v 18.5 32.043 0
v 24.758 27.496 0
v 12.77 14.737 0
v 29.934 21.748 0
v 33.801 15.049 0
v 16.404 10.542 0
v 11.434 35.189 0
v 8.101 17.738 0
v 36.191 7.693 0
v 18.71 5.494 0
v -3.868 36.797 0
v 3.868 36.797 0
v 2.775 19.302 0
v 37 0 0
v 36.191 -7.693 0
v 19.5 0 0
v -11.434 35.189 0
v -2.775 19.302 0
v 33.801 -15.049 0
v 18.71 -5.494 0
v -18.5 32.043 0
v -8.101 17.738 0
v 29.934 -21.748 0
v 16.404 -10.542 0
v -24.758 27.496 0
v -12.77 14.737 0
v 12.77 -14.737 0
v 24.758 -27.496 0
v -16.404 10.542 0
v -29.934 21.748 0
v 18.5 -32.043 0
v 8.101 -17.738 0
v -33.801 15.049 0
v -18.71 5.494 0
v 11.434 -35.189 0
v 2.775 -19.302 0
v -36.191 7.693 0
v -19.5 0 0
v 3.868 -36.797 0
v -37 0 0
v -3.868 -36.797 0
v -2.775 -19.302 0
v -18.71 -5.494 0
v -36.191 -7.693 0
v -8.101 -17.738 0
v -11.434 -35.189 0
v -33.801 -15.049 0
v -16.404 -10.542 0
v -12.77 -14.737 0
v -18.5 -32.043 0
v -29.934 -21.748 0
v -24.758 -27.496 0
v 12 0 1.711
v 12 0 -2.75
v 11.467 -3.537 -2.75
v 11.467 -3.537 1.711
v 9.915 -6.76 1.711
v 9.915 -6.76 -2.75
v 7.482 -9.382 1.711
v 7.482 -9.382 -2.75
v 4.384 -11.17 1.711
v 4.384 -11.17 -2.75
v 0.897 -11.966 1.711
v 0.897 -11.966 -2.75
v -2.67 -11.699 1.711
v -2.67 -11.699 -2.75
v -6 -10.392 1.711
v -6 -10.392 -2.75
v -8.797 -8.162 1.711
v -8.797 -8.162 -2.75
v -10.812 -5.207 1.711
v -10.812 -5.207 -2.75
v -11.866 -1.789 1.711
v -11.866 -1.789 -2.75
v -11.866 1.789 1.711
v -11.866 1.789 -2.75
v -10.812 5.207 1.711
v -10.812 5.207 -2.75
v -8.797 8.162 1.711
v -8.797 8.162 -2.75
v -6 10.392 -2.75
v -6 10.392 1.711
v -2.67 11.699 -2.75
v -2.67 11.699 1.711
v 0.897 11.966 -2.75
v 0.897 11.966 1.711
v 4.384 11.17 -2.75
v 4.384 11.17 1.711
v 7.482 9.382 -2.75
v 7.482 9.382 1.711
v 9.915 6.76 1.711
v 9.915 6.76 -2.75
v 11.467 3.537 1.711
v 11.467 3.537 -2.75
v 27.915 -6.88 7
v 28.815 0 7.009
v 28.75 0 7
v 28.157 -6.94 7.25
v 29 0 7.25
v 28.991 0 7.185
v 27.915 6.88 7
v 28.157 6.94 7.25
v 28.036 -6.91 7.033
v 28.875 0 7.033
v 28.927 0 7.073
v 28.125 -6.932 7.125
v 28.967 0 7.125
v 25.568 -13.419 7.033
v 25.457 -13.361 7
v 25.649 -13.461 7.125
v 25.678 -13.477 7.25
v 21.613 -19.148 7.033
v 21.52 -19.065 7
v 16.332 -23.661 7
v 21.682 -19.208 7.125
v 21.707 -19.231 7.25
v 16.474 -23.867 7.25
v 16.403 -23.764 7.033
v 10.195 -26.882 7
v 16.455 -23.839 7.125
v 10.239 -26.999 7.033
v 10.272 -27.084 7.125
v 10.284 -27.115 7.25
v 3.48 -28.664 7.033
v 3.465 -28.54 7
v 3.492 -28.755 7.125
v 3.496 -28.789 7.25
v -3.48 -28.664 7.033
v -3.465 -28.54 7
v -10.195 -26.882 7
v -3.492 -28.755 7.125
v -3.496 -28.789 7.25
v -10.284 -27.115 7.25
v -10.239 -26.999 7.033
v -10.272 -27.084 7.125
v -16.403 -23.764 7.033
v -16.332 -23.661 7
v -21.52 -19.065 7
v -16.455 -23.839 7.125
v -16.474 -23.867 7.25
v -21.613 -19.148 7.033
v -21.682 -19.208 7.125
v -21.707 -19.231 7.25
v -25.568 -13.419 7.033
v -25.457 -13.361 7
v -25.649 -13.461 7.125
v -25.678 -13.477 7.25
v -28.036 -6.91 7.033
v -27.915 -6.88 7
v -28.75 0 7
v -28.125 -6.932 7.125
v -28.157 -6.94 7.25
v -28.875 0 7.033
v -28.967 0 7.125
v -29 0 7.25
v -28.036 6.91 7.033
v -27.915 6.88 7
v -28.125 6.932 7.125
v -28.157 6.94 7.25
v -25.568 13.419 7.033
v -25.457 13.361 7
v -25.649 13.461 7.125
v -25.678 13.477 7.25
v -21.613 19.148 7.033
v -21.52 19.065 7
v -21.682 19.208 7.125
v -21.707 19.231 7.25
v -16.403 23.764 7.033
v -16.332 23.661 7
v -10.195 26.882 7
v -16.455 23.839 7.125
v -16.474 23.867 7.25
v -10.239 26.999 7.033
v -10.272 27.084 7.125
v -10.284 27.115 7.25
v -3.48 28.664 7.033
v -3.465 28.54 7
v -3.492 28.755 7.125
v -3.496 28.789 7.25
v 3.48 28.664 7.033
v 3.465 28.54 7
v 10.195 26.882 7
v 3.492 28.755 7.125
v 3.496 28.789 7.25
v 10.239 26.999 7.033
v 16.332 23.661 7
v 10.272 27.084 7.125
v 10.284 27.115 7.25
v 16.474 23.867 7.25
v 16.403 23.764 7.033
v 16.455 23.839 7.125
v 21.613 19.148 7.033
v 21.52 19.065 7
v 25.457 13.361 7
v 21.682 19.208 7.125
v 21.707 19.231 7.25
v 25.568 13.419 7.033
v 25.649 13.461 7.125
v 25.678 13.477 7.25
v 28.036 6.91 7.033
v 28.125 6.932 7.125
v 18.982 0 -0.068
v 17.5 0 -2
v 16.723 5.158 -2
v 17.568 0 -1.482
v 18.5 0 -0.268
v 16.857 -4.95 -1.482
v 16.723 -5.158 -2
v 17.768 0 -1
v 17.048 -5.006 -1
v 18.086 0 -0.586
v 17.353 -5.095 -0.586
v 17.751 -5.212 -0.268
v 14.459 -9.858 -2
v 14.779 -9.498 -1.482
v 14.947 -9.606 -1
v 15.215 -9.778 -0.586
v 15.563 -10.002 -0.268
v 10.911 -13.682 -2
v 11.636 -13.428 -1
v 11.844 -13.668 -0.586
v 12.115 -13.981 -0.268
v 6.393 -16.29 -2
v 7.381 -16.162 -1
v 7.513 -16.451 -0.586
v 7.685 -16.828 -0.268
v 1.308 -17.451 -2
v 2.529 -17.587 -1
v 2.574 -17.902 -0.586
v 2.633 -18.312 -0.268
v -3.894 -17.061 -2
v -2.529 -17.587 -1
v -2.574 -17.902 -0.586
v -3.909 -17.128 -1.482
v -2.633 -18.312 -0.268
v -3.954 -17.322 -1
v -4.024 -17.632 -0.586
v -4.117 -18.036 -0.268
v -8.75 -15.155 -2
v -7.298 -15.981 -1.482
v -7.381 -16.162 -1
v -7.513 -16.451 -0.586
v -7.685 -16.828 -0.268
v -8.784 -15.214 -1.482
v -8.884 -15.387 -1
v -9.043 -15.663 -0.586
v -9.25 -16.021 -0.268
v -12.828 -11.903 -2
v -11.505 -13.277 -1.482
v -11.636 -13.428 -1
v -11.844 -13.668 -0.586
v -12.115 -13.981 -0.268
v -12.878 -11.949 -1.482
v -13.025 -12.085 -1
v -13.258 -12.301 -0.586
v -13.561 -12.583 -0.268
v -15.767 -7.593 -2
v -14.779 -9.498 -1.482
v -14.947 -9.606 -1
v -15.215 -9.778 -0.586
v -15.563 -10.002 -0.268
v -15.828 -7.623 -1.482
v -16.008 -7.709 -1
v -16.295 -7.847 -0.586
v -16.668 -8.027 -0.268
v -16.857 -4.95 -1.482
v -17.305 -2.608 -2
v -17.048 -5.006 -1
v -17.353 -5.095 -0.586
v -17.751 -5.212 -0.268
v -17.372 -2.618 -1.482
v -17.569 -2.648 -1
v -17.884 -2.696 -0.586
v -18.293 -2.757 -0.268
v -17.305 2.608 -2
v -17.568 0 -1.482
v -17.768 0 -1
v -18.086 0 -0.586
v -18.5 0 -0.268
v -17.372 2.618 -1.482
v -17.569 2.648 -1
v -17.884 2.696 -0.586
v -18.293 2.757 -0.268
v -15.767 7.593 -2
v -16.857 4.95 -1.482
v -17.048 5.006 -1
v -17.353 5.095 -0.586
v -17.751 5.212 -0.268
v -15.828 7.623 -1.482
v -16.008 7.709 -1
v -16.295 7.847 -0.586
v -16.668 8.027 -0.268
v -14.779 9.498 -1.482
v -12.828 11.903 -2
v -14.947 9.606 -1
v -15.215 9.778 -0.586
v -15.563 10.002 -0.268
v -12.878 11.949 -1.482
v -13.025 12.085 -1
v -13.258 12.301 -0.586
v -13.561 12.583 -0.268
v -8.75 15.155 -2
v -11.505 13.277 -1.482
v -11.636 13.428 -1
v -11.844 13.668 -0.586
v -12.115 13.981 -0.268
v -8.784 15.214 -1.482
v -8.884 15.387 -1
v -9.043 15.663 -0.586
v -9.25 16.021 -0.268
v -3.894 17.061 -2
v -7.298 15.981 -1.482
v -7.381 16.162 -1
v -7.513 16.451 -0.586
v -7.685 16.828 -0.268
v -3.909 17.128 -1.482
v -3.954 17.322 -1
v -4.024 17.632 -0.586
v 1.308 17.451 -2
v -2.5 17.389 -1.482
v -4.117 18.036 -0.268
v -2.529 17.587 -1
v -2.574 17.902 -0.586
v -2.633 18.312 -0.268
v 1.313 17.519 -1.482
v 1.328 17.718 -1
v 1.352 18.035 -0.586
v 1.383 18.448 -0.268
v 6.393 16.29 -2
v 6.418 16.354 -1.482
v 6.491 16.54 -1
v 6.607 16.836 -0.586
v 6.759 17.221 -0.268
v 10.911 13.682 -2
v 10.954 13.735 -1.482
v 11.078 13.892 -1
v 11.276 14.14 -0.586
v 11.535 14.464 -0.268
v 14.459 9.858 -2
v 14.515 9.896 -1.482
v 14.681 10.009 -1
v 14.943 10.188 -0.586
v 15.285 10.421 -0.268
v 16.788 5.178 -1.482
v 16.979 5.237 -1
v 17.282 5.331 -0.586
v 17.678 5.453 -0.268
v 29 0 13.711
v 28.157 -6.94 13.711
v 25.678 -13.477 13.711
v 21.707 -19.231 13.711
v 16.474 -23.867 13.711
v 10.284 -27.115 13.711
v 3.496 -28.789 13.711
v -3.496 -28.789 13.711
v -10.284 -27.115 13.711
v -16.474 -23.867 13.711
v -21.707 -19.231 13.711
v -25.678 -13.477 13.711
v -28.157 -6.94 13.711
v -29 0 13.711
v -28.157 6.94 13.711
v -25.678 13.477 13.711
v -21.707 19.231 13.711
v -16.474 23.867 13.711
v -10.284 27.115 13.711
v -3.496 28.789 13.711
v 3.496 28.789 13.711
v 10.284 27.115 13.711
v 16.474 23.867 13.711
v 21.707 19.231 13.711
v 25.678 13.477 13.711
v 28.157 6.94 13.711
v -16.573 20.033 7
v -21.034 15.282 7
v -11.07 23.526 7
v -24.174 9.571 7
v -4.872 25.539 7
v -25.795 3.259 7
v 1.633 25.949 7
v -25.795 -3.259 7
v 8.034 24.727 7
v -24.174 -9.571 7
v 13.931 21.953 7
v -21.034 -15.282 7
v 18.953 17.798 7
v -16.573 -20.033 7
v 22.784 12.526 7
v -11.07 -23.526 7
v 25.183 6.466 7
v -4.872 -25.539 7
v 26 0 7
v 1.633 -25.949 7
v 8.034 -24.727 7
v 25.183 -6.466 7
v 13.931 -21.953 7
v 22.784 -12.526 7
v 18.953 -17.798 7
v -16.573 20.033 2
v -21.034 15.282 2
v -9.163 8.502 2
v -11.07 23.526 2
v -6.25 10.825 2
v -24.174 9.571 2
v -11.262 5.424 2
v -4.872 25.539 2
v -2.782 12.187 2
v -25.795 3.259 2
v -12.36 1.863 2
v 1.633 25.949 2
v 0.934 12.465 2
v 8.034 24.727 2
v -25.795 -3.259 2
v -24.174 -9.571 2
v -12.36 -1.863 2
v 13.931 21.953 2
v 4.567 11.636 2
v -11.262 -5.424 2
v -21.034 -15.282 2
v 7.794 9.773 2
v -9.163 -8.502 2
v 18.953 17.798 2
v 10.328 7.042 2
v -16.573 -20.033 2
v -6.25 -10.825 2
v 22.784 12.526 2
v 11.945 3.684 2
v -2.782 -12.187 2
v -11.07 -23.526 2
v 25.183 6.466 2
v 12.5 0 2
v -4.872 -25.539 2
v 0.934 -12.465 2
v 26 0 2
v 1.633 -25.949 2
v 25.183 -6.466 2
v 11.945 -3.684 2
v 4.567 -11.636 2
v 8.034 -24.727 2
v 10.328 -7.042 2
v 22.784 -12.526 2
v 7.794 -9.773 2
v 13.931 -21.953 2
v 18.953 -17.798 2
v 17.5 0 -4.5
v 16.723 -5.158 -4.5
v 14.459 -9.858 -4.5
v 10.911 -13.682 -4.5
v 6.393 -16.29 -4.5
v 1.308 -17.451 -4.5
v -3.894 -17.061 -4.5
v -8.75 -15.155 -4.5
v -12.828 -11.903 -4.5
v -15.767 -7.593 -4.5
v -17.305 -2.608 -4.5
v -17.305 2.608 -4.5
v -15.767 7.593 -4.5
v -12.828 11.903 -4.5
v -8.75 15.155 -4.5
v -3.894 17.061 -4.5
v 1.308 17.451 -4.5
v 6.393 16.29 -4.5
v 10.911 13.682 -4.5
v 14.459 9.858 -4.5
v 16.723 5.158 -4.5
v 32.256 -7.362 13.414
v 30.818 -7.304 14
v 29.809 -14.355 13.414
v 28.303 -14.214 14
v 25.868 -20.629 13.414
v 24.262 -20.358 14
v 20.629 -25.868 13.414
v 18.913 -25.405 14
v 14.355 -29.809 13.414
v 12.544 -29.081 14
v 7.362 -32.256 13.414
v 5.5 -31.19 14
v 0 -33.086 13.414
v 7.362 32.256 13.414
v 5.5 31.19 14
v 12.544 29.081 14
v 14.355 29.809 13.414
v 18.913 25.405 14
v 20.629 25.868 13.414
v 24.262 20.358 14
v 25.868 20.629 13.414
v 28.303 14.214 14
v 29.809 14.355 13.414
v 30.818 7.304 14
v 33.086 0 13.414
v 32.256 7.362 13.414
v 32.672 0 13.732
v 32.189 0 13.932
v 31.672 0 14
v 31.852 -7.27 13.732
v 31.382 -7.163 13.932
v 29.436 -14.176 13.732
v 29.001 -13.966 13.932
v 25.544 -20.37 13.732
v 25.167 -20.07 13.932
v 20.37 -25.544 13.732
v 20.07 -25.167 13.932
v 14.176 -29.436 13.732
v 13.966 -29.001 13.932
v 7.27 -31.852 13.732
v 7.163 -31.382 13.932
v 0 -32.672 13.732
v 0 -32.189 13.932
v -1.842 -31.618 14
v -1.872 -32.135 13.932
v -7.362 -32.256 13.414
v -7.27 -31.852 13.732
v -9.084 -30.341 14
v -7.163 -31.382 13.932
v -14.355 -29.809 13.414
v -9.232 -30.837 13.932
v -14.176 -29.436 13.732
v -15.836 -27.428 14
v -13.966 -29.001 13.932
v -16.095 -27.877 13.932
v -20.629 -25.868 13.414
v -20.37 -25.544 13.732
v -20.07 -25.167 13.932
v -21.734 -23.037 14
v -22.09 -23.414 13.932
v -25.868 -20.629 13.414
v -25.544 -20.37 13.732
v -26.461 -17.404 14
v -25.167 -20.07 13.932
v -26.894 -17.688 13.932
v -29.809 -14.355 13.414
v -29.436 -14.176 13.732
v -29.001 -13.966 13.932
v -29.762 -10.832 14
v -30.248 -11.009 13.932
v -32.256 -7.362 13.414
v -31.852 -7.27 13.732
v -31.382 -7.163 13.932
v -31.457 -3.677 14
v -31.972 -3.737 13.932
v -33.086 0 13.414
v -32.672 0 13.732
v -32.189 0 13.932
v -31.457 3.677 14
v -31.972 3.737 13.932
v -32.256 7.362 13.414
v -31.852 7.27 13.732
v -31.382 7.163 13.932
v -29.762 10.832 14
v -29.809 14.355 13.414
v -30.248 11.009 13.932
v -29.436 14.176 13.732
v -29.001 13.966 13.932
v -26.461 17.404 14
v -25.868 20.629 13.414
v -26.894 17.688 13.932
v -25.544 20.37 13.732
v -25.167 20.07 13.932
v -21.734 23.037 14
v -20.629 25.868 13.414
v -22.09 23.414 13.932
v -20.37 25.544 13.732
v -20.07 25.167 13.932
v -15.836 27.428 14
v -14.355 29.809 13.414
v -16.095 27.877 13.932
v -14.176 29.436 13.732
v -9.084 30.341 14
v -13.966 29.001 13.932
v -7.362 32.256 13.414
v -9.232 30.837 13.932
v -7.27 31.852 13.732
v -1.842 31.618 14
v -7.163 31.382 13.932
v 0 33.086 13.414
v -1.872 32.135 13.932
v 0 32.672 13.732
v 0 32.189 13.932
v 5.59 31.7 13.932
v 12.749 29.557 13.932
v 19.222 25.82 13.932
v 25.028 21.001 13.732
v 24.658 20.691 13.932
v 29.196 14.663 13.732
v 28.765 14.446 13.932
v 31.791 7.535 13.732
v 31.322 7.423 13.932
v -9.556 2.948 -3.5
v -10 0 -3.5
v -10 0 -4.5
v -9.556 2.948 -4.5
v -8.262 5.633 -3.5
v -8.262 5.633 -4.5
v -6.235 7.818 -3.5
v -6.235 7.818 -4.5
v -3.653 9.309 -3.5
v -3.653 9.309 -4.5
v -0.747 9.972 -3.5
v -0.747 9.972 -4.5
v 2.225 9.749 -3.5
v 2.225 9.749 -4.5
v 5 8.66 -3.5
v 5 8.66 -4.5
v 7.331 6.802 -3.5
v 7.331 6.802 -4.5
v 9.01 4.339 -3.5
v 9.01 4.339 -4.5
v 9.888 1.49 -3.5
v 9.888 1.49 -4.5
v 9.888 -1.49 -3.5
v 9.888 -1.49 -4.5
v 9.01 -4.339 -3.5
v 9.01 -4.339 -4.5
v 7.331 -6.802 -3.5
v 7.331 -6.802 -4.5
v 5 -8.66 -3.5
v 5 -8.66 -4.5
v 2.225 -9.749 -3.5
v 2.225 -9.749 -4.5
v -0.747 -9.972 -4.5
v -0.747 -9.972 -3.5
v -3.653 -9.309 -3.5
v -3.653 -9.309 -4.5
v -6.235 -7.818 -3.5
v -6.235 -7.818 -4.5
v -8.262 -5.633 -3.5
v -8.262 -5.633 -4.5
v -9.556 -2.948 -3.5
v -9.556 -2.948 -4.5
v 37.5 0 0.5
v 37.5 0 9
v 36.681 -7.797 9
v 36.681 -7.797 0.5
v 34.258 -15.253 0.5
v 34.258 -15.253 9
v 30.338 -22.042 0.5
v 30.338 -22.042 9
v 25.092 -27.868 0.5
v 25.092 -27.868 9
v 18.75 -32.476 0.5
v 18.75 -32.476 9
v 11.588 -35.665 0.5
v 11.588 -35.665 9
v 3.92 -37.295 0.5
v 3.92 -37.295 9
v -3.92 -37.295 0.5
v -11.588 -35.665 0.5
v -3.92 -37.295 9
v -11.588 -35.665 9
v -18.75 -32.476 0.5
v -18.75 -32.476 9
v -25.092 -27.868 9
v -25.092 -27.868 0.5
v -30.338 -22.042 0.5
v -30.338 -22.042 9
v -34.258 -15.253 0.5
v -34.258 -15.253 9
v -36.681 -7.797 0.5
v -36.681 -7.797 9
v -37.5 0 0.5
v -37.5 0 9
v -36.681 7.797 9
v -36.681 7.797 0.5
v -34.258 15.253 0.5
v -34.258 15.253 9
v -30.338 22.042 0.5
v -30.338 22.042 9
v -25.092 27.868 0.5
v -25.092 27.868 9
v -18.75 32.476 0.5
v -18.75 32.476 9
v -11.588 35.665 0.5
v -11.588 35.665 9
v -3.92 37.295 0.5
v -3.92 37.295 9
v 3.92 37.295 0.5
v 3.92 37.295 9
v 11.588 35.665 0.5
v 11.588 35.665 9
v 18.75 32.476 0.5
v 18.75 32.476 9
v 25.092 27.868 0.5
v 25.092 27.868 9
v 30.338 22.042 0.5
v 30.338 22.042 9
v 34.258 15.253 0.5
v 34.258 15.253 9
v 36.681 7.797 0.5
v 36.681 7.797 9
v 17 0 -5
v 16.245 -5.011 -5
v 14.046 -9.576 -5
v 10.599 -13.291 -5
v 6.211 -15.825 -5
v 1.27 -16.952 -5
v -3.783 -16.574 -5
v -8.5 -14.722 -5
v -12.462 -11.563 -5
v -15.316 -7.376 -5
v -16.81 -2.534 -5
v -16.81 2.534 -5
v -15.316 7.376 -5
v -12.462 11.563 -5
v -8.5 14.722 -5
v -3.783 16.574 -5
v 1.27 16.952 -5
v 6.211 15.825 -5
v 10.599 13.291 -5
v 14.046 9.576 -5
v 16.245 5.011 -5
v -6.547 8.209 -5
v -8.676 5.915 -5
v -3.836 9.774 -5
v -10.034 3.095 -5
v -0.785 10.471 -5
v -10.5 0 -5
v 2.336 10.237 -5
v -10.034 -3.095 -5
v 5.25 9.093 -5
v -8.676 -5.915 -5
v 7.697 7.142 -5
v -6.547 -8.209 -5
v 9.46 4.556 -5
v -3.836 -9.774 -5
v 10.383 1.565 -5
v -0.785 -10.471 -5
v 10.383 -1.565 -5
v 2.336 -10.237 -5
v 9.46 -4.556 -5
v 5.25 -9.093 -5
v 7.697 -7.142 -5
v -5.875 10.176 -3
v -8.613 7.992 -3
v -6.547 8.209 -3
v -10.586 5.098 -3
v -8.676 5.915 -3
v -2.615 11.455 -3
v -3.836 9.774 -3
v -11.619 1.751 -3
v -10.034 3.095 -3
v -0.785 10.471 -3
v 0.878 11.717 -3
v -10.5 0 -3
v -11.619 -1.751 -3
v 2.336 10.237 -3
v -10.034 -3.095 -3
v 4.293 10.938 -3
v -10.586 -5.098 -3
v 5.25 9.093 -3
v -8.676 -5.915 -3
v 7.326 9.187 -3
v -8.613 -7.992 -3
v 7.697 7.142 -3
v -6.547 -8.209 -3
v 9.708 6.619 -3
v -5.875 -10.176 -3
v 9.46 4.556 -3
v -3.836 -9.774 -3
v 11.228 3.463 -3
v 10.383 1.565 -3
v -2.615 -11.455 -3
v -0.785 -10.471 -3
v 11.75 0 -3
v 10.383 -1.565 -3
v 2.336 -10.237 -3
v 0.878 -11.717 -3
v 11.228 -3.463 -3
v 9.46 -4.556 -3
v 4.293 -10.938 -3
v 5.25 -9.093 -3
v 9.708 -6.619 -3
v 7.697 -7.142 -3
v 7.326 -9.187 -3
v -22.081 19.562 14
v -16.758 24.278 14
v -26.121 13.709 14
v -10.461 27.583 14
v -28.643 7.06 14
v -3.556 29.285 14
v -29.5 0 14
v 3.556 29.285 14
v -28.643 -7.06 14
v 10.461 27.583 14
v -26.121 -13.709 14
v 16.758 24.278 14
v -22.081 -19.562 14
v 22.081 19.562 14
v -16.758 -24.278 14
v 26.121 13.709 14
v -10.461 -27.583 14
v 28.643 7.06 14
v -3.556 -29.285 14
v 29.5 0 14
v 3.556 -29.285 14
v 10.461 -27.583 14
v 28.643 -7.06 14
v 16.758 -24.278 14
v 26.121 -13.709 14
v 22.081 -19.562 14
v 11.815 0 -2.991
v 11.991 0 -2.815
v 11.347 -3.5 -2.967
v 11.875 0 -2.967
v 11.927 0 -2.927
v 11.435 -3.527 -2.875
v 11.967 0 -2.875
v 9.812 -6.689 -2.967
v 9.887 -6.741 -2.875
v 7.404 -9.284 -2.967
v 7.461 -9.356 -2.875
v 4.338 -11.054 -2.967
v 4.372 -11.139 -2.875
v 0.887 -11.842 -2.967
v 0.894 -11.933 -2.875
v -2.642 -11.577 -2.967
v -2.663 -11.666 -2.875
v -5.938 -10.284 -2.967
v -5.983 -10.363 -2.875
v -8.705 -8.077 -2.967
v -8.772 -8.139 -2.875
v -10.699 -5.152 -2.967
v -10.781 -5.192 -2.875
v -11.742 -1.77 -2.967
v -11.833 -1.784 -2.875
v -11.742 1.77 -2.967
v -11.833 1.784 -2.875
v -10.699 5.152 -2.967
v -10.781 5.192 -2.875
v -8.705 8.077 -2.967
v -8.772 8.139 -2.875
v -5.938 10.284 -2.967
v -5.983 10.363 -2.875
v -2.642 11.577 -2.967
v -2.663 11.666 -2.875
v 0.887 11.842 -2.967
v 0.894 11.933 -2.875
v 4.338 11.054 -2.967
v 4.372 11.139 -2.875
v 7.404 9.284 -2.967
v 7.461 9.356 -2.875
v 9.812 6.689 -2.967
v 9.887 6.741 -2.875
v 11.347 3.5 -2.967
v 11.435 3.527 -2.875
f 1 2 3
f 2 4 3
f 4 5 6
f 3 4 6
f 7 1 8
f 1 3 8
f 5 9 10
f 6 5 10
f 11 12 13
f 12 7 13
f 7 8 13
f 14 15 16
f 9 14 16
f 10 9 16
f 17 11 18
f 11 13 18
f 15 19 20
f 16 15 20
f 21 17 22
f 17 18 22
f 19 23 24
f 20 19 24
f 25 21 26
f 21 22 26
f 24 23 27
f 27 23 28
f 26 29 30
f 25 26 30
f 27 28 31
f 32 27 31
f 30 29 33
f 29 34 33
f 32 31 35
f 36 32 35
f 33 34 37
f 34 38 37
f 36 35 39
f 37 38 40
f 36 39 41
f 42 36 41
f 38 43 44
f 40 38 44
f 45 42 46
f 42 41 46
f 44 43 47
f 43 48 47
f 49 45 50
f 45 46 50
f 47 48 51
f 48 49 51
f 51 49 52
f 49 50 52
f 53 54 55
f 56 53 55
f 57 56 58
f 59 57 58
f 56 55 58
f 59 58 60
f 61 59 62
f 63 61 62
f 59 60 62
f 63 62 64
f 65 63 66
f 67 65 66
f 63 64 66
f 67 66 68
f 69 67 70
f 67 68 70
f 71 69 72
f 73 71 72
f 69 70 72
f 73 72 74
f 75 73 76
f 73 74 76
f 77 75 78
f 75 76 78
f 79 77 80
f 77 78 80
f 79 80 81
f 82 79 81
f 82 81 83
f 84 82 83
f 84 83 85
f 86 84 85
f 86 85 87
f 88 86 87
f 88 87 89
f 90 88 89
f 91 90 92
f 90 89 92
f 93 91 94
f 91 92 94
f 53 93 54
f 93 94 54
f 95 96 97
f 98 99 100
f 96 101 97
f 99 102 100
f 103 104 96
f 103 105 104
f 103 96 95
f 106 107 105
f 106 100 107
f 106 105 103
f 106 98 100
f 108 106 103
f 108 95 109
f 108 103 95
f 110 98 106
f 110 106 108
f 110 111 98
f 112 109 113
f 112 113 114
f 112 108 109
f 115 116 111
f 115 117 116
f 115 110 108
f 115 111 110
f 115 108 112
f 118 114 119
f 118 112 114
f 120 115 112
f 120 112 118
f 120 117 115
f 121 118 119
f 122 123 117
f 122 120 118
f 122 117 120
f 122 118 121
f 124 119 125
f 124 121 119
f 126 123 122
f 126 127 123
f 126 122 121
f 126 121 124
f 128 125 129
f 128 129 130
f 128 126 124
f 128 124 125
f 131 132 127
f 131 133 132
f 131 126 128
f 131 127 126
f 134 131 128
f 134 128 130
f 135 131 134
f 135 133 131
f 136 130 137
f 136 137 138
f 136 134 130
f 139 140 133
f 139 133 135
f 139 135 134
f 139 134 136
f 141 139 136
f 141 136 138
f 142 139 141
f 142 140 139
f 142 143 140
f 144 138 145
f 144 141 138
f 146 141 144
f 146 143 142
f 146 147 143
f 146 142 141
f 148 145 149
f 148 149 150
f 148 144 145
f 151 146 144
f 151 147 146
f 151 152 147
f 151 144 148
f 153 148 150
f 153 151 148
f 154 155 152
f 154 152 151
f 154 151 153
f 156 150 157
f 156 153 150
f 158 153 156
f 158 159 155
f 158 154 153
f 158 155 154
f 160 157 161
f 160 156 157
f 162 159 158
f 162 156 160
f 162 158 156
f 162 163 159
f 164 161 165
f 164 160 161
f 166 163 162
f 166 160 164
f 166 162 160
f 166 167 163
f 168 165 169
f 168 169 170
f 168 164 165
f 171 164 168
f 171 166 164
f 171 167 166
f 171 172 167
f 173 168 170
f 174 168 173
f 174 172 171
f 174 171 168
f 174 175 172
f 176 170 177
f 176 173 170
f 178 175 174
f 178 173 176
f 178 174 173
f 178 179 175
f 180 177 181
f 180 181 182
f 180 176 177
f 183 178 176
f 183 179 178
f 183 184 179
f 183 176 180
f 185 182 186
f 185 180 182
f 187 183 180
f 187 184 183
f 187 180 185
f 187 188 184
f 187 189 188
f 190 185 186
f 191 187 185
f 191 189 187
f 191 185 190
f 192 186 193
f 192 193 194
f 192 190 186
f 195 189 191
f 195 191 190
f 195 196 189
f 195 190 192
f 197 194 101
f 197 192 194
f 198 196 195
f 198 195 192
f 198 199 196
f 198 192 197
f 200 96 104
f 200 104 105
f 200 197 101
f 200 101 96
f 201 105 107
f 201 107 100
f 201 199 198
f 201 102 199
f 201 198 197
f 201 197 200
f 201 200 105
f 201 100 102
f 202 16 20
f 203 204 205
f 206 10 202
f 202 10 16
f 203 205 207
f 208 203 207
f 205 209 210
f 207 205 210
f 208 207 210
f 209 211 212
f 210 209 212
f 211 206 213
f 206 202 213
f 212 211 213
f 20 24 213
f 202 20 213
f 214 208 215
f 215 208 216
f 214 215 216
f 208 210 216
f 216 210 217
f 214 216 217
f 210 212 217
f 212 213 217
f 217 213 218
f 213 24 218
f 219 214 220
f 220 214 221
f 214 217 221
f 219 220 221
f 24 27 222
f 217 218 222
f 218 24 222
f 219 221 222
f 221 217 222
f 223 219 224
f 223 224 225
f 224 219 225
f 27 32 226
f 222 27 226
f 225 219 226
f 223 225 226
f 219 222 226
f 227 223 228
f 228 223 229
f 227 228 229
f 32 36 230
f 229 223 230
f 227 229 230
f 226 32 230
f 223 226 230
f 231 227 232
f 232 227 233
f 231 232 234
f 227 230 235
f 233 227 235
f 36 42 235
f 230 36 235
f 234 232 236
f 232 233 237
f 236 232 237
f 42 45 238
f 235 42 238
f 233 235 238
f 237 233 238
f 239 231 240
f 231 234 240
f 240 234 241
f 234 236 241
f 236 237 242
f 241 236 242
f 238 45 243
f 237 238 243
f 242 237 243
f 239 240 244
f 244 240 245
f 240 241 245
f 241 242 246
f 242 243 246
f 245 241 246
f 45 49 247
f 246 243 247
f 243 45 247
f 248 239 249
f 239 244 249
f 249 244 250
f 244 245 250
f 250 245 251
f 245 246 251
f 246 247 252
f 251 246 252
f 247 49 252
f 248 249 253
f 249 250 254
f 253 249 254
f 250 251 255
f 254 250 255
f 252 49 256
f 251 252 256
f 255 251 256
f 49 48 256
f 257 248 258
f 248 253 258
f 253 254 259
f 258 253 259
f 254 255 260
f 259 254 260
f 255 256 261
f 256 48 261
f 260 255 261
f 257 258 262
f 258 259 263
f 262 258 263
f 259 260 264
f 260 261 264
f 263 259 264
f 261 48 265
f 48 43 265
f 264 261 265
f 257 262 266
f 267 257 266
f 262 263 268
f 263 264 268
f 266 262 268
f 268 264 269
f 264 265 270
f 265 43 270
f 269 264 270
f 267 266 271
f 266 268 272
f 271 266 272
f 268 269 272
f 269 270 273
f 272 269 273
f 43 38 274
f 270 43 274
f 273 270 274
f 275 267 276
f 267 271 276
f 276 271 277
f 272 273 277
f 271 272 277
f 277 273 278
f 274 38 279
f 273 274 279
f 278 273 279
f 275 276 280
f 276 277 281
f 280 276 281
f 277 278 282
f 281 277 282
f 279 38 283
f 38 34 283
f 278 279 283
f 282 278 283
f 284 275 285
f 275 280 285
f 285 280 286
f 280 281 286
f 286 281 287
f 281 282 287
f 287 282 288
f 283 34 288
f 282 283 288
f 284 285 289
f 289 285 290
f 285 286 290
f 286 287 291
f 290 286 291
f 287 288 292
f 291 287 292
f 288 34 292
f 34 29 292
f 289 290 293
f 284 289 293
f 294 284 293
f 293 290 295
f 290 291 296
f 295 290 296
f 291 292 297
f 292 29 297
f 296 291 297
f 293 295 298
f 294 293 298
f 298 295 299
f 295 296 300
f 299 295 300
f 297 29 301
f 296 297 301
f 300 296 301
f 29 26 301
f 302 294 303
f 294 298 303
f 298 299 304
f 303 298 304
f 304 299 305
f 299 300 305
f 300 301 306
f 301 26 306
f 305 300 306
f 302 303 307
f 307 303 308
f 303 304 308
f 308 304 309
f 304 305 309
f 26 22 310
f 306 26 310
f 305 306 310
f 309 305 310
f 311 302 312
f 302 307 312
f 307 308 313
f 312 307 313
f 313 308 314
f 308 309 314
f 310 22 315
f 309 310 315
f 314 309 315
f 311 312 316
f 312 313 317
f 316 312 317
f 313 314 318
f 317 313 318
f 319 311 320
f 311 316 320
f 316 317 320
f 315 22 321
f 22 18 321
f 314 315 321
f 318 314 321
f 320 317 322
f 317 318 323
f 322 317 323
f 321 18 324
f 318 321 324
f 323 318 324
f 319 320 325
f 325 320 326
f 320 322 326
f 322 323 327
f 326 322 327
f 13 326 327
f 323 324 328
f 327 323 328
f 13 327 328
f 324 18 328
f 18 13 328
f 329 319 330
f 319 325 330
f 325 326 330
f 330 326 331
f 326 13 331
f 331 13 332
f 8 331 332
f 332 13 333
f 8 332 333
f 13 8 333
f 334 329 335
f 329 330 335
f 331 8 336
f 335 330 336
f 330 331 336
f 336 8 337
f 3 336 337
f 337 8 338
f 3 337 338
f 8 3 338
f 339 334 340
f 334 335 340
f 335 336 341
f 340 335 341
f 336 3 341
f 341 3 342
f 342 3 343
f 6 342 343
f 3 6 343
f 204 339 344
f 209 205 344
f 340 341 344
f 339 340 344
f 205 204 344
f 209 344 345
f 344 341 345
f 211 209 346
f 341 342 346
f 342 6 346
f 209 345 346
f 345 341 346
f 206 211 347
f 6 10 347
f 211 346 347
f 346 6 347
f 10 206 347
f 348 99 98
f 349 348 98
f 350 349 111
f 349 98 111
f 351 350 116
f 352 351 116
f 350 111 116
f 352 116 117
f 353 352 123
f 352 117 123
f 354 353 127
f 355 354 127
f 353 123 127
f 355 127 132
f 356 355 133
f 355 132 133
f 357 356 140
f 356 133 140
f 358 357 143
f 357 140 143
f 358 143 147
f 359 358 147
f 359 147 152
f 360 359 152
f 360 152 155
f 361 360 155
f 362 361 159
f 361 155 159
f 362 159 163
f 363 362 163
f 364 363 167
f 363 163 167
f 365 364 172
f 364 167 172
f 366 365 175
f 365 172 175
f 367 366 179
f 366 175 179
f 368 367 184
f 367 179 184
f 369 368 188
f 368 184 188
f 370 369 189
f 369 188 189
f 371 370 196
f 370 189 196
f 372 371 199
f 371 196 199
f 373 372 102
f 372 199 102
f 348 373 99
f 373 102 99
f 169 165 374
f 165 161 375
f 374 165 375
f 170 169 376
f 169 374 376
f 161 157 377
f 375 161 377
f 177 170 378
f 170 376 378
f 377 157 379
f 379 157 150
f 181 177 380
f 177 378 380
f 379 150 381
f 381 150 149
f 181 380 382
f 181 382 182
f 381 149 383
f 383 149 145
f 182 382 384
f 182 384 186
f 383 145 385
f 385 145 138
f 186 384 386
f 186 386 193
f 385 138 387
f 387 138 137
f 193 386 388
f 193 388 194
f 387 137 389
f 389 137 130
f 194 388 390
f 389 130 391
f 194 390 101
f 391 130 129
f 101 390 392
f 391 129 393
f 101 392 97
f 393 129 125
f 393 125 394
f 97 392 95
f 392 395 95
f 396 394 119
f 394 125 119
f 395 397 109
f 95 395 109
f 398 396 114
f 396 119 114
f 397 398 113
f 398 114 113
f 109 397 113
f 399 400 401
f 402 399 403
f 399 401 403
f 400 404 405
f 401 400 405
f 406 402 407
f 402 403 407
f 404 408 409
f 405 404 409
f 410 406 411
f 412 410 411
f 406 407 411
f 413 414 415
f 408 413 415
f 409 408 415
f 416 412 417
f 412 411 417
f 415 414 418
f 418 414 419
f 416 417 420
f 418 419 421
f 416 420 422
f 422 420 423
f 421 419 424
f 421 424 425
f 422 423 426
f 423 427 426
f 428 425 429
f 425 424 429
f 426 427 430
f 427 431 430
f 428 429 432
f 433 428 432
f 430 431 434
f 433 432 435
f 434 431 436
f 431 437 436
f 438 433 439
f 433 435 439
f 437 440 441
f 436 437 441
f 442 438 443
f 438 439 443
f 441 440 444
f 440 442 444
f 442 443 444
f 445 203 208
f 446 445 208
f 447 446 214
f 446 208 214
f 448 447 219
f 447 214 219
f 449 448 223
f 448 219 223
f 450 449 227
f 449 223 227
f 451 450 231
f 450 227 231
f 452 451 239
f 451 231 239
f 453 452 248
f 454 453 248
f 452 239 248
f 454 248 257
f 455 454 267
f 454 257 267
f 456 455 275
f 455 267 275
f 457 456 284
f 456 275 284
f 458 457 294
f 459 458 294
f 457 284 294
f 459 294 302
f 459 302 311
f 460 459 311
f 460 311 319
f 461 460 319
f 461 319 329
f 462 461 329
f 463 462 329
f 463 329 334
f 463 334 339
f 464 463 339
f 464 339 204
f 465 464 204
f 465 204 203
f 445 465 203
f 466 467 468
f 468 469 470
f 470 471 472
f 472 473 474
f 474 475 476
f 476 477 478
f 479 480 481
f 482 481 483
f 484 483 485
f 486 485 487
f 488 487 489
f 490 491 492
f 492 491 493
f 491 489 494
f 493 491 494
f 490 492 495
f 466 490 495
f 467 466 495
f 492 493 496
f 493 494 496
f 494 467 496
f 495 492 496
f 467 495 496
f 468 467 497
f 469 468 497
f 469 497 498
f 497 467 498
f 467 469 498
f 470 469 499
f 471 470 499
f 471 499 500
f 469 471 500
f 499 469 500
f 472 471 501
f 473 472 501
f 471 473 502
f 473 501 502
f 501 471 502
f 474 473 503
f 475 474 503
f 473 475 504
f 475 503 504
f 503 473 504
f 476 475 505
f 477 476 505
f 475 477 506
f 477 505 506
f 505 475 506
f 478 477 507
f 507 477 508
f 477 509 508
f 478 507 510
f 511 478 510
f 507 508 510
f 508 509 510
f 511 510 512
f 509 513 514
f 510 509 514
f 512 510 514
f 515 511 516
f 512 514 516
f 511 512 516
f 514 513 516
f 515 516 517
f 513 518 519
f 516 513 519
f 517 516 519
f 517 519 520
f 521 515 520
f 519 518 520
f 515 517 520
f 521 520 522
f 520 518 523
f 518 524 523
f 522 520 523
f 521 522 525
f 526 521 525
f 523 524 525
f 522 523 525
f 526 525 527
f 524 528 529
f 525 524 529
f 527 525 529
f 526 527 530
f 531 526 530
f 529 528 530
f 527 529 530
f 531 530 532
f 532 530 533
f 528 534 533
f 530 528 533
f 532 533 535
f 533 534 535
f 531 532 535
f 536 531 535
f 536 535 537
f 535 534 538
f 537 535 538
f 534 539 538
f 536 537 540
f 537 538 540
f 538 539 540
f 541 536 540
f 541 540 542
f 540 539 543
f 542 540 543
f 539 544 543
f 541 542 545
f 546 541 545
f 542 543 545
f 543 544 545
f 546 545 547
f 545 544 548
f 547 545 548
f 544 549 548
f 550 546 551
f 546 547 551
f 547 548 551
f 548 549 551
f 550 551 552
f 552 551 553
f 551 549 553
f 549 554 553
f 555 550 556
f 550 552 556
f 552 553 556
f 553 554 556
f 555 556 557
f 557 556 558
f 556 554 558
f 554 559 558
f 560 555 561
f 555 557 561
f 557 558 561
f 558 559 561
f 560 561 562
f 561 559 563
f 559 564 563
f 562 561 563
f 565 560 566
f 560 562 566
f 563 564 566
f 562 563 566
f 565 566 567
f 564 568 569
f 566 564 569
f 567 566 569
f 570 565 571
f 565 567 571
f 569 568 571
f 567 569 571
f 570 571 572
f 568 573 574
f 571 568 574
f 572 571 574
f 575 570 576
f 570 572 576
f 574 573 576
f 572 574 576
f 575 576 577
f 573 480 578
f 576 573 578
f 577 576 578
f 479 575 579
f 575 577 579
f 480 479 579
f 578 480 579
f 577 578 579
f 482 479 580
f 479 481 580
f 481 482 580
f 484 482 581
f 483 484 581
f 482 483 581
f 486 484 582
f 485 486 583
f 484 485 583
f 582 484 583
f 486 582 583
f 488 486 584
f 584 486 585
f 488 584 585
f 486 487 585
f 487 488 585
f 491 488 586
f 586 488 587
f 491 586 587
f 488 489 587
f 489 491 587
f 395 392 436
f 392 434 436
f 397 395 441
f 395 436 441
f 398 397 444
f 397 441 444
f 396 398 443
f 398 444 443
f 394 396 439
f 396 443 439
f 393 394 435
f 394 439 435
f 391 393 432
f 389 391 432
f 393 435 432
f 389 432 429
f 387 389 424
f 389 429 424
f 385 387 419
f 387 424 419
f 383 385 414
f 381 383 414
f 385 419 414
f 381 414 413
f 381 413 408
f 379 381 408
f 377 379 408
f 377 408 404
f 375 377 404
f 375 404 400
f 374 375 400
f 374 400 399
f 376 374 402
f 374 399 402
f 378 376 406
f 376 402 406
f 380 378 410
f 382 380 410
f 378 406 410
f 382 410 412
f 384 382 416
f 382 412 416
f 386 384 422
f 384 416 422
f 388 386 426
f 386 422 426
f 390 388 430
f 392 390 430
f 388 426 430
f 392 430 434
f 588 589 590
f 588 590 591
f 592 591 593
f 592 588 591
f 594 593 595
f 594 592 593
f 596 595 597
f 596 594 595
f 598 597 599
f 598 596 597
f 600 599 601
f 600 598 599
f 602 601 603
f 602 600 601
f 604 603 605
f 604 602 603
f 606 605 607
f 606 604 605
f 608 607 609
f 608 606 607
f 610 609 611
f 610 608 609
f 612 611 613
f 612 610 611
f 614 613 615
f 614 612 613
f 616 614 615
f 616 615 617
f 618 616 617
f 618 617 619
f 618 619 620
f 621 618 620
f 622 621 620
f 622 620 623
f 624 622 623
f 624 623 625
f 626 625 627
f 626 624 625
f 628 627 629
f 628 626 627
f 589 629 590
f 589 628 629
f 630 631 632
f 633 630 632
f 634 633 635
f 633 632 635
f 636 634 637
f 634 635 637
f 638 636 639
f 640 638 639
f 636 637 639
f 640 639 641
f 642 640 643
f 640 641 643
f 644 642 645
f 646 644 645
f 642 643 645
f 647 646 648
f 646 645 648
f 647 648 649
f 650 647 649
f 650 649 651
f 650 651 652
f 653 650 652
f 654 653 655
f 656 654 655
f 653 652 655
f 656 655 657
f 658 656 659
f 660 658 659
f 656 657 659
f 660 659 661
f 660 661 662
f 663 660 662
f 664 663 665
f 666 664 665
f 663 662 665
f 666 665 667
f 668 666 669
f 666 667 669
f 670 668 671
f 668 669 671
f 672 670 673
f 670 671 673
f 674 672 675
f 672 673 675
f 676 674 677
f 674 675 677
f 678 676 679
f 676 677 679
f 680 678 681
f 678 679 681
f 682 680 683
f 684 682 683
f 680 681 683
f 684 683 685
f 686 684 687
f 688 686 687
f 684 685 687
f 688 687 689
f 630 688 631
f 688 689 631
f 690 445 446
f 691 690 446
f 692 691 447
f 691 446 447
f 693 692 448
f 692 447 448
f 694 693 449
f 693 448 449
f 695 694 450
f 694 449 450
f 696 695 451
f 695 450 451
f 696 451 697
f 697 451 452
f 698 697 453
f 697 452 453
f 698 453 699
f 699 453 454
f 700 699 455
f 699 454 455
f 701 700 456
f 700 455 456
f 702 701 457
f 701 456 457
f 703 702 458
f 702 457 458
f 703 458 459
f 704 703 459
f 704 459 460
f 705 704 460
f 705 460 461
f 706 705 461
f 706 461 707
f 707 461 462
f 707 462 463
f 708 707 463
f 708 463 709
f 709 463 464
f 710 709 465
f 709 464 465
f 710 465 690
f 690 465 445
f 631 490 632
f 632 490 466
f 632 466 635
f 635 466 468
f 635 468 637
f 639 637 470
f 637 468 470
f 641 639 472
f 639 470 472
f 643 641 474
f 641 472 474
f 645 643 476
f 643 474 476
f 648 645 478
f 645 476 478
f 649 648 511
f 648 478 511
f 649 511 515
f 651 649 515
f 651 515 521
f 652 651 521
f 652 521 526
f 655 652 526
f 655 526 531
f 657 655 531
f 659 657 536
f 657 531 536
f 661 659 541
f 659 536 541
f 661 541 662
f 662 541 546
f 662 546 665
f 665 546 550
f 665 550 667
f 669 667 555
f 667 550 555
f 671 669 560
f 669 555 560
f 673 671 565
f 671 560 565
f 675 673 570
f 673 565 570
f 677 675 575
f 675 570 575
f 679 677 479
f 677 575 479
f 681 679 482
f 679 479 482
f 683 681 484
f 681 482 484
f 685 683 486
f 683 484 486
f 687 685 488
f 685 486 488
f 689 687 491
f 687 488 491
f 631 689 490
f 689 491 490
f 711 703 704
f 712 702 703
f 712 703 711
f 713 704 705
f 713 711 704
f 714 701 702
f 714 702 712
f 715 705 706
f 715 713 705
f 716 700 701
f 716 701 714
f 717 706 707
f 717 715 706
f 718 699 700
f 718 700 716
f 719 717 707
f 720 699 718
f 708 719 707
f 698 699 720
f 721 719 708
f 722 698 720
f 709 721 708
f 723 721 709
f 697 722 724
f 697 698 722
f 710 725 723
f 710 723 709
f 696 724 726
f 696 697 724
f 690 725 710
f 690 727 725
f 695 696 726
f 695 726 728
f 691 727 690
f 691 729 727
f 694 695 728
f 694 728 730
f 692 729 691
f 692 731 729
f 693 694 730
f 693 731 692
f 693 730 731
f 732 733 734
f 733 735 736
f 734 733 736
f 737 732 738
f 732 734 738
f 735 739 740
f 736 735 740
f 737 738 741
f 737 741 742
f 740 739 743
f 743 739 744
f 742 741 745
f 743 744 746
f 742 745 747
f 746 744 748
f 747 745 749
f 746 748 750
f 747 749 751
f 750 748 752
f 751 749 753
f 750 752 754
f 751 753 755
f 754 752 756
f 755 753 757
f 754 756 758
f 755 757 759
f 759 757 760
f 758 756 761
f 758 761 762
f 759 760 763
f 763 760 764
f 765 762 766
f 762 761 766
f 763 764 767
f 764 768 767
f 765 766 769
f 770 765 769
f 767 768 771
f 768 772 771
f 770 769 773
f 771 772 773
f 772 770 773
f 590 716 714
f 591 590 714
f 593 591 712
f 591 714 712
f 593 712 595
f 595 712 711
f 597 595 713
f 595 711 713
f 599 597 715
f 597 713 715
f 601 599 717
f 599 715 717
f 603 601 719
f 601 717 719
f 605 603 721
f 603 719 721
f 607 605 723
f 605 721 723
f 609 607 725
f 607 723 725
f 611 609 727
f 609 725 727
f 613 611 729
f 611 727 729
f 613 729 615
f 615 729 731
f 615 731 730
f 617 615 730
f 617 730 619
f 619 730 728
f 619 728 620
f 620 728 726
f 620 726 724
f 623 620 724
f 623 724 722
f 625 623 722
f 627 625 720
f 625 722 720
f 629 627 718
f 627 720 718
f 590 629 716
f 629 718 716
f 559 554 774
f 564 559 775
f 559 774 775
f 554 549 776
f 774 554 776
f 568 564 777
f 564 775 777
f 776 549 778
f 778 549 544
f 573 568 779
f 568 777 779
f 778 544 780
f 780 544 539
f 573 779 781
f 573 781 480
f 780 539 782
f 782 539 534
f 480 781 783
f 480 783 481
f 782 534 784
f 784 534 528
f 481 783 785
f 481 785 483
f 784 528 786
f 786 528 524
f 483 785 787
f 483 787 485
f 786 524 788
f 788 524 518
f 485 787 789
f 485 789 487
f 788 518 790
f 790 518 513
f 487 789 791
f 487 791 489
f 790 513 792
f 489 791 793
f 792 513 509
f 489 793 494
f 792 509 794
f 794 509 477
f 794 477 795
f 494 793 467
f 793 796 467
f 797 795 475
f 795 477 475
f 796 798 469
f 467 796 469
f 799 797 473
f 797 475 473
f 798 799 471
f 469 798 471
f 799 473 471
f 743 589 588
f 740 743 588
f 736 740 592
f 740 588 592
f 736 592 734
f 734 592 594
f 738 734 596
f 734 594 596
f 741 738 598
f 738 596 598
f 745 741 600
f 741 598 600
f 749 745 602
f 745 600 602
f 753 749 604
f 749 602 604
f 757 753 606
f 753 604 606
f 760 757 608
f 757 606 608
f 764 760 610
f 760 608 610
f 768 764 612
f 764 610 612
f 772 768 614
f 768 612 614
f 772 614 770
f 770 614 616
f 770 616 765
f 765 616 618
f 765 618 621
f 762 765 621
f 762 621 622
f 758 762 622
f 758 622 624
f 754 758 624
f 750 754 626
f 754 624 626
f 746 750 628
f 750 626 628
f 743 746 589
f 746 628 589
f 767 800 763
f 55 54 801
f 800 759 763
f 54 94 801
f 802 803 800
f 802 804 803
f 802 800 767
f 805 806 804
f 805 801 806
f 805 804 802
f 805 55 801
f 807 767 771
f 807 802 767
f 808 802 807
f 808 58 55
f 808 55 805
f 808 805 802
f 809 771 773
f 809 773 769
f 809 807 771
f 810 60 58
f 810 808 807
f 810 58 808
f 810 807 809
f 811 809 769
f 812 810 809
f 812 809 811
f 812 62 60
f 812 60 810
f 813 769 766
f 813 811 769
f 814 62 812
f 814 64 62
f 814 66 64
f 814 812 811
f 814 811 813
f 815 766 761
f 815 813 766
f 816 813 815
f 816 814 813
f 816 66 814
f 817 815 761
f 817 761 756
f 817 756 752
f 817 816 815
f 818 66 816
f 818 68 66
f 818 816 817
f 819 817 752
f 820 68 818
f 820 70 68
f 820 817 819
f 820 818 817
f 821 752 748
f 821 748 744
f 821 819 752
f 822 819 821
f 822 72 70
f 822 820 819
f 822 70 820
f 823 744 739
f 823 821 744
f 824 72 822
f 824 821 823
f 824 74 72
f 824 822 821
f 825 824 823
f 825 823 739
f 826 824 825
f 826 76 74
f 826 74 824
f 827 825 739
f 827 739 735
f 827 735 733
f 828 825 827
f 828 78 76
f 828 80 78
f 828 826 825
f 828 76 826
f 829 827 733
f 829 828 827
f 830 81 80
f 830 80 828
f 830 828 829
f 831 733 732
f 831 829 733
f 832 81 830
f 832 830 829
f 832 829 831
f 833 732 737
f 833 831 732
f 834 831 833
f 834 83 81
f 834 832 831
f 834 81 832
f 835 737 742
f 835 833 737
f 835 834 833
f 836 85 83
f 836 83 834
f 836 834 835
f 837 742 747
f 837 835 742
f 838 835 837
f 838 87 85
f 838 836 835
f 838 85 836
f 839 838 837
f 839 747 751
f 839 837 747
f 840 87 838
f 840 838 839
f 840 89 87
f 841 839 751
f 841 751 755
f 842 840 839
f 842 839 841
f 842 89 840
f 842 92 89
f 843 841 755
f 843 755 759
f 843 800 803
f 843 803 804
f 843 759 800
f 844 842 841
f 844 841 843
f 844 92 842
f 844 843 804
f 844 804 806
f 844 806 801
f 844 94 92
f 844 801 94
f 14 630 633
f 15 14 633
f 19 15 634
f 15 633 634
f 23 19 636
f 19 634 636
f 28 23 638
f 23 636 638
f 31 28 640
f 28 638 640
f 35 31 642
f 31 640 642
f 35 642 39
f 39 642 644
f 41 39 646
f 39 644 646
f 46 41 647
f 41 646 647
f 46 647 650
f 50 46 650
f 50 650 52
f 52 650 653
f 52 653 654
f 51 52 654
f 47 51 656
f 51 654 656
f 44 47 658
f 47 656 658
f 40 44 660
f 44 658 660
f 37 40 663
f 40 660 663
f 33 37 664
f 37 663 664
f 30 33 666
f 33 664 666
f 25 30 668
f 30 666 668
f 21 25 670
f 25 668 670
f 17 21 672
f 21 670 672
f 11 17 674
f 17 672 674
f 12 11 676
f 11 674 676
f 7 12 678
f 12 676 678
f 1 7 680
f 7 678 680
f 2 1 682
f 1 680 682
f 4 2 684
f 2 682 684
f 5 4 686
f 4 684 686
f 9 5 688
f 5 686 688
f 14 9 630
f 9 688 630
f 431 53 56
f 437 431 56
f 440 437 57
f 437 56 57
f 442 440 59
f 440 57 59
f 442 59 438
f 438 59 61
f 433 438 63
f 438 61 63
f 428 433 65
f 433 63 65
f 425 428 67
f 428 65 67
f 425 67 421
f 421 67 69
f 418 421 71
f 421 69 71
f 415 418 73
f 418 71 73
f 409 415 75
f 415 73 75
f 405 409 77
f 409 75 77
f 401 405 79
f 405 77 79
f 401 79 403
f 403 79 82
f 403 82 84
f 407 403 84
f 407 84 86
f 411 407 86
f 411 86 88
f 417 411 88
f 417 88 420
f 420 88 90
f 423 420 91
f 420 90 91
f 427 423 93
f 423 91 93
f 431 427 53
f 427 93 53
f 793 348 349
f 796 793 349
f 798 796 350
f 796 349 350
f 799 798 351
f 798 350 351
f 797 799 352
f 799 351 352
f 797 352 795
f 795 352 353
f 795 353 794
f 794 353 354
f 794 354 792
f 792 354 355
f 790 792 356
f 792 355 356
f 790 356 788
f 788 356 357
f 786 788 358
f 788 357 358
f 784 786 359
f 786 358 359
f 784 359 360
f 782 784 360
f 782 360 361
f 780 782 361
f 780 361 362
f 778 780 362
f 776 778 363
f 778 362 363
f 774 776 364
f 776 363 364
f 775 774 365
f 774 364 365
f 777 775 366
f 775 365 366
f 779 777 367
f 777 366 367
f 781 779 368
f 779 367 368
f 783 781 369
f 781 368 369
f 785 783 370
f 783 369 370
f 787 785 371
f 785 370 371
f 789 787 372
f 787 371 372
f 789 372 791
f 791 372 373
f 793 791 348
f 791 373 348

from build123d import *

# Parameters (mm, degrees)
FILLET_1_R      = 2
CHAMFER_1_SIZE  = 0.5
CHAMFER_1_SIZE2 = 0.288675135
CHAMFER_2_SIZE  = 0.5
CHAMFER_2_SIZE2 = 0.288675135
SKETCH_2_R      = 17.5
SKETCH_2_R_2    = 10
EXTRUDE_1_DEPTH = 2
CHAMFER_3_SIZE  = 0.5
CHAMFER_4_SIZE  = 0.5
FILLET_2_R      = 0.25


with BuildPart() as part:
    # ｽｹｯﾁ1 → 回転1 (revolve)
    with BuildSketch(Plane(origin=(0, 0, 0), x_dir=(0, 0, -1), z_dir=(1, 0, 0)), mode=Mode.PRIVATE) as revolve_1_sk:
        Polygon((-9, 37.5), (-14, 32.5), (-14, 29), (-7, 29), (-7, 26), (-2, 26), (-2, 12), (3, 12), (3, 17.5), (0, 17.5), (0, 37.5), align=None)
    revolve(revolve_1_sk.sketch.rotate(Axis((0, 0, 26.899509804), (0, 0, -1)), 90), axis=Axis((0, 0, 26.899509804), (0, 0, -1)))

    # ﾌｨﾚｯﾄ1
    fillet_1_edges = [part.edges().sort_by_distance(p)[0] for p in [
        (-17.5, 0, 0),
        (-32.5, 0, 14),
    ]]
    fillet(fillet_1_edges, radius=FILLET_1_R)

    # 面取り1
    chamfer_1_edges = [part.edges().sort_by_distance(p)[0] for p in [
        (-29, 0, 14),
    ]]
    chamfer_1_side = [part.faces().sort_by_distance(p)[0] for p in [
        (-30.775765517, 0, 14),
    ]]
    chamfer(chamfer_1_edges, length=CHAMFER_1_SIZE, length2=CHAMFER_1_SIZE2, reference=chamfer_1_side[0])

    # 面取り2
    chamfer_2_edges = [part.edges().sort_by_distance(p)[0] for p in [
        (-12, 0, 2),
    ]]
    chamfer_2_side = [part.faces().sort_by_distance(p)[0] for p in [
        (-25.264608948, 0, 2),
    ]]
    chamfer(chamfer_2_edges, length=CHAMFER_2_SIZE, length2=CHAMFER_2_SIZE2, reference=chamfer_2_side[0])

    # ｽｹｯﾁ2 → ﾎﾞｽ - 押し出し1 (add)
    with BuildSketch(Plane(origin=(0, 0, -3), x_dir=(-1, 0, 0), z_dir=(0, 0, -1))):
        with Locations(Location((0, 0, 0), (0, 0, 180))):
            Circle(SKETCH_2_R)
        Circle(SKETCH_2_R_2, mode=Mode.SUBTRACT)
    extrude(amount=EXTRUDE_1_DEPTH)

    # 面取り3
    chamfer_3_edges = [part.edges().sort_by_distance(p)[0] for p in [
        (10, 0, -3),
        (10, 0, -5),
    ]]
    chamfer(chamfer_3_edges, length=CHAMFER_3_SIZE)

    # 面取り4
    chamfer_4_edges = [part.edges().sort_by_distance(p)[0] for p in [
        (-37.5, 0, 0),
        (-17.5, 0, -5),
    ]]
    chamfer(chamfer_4_edges, length=CHAMFER_4_SIZE)

    # ﾌｨﾚｯﾄ2
    fillet_2_edges = [part.edges().sort_by_distance(p)[0] for p in [
        (-12, 0, -3),
        (-29, 0, 7),
    ]]
    fillet(fillet_2_edges, radius=FILLET_2_R)


solid = part.part
